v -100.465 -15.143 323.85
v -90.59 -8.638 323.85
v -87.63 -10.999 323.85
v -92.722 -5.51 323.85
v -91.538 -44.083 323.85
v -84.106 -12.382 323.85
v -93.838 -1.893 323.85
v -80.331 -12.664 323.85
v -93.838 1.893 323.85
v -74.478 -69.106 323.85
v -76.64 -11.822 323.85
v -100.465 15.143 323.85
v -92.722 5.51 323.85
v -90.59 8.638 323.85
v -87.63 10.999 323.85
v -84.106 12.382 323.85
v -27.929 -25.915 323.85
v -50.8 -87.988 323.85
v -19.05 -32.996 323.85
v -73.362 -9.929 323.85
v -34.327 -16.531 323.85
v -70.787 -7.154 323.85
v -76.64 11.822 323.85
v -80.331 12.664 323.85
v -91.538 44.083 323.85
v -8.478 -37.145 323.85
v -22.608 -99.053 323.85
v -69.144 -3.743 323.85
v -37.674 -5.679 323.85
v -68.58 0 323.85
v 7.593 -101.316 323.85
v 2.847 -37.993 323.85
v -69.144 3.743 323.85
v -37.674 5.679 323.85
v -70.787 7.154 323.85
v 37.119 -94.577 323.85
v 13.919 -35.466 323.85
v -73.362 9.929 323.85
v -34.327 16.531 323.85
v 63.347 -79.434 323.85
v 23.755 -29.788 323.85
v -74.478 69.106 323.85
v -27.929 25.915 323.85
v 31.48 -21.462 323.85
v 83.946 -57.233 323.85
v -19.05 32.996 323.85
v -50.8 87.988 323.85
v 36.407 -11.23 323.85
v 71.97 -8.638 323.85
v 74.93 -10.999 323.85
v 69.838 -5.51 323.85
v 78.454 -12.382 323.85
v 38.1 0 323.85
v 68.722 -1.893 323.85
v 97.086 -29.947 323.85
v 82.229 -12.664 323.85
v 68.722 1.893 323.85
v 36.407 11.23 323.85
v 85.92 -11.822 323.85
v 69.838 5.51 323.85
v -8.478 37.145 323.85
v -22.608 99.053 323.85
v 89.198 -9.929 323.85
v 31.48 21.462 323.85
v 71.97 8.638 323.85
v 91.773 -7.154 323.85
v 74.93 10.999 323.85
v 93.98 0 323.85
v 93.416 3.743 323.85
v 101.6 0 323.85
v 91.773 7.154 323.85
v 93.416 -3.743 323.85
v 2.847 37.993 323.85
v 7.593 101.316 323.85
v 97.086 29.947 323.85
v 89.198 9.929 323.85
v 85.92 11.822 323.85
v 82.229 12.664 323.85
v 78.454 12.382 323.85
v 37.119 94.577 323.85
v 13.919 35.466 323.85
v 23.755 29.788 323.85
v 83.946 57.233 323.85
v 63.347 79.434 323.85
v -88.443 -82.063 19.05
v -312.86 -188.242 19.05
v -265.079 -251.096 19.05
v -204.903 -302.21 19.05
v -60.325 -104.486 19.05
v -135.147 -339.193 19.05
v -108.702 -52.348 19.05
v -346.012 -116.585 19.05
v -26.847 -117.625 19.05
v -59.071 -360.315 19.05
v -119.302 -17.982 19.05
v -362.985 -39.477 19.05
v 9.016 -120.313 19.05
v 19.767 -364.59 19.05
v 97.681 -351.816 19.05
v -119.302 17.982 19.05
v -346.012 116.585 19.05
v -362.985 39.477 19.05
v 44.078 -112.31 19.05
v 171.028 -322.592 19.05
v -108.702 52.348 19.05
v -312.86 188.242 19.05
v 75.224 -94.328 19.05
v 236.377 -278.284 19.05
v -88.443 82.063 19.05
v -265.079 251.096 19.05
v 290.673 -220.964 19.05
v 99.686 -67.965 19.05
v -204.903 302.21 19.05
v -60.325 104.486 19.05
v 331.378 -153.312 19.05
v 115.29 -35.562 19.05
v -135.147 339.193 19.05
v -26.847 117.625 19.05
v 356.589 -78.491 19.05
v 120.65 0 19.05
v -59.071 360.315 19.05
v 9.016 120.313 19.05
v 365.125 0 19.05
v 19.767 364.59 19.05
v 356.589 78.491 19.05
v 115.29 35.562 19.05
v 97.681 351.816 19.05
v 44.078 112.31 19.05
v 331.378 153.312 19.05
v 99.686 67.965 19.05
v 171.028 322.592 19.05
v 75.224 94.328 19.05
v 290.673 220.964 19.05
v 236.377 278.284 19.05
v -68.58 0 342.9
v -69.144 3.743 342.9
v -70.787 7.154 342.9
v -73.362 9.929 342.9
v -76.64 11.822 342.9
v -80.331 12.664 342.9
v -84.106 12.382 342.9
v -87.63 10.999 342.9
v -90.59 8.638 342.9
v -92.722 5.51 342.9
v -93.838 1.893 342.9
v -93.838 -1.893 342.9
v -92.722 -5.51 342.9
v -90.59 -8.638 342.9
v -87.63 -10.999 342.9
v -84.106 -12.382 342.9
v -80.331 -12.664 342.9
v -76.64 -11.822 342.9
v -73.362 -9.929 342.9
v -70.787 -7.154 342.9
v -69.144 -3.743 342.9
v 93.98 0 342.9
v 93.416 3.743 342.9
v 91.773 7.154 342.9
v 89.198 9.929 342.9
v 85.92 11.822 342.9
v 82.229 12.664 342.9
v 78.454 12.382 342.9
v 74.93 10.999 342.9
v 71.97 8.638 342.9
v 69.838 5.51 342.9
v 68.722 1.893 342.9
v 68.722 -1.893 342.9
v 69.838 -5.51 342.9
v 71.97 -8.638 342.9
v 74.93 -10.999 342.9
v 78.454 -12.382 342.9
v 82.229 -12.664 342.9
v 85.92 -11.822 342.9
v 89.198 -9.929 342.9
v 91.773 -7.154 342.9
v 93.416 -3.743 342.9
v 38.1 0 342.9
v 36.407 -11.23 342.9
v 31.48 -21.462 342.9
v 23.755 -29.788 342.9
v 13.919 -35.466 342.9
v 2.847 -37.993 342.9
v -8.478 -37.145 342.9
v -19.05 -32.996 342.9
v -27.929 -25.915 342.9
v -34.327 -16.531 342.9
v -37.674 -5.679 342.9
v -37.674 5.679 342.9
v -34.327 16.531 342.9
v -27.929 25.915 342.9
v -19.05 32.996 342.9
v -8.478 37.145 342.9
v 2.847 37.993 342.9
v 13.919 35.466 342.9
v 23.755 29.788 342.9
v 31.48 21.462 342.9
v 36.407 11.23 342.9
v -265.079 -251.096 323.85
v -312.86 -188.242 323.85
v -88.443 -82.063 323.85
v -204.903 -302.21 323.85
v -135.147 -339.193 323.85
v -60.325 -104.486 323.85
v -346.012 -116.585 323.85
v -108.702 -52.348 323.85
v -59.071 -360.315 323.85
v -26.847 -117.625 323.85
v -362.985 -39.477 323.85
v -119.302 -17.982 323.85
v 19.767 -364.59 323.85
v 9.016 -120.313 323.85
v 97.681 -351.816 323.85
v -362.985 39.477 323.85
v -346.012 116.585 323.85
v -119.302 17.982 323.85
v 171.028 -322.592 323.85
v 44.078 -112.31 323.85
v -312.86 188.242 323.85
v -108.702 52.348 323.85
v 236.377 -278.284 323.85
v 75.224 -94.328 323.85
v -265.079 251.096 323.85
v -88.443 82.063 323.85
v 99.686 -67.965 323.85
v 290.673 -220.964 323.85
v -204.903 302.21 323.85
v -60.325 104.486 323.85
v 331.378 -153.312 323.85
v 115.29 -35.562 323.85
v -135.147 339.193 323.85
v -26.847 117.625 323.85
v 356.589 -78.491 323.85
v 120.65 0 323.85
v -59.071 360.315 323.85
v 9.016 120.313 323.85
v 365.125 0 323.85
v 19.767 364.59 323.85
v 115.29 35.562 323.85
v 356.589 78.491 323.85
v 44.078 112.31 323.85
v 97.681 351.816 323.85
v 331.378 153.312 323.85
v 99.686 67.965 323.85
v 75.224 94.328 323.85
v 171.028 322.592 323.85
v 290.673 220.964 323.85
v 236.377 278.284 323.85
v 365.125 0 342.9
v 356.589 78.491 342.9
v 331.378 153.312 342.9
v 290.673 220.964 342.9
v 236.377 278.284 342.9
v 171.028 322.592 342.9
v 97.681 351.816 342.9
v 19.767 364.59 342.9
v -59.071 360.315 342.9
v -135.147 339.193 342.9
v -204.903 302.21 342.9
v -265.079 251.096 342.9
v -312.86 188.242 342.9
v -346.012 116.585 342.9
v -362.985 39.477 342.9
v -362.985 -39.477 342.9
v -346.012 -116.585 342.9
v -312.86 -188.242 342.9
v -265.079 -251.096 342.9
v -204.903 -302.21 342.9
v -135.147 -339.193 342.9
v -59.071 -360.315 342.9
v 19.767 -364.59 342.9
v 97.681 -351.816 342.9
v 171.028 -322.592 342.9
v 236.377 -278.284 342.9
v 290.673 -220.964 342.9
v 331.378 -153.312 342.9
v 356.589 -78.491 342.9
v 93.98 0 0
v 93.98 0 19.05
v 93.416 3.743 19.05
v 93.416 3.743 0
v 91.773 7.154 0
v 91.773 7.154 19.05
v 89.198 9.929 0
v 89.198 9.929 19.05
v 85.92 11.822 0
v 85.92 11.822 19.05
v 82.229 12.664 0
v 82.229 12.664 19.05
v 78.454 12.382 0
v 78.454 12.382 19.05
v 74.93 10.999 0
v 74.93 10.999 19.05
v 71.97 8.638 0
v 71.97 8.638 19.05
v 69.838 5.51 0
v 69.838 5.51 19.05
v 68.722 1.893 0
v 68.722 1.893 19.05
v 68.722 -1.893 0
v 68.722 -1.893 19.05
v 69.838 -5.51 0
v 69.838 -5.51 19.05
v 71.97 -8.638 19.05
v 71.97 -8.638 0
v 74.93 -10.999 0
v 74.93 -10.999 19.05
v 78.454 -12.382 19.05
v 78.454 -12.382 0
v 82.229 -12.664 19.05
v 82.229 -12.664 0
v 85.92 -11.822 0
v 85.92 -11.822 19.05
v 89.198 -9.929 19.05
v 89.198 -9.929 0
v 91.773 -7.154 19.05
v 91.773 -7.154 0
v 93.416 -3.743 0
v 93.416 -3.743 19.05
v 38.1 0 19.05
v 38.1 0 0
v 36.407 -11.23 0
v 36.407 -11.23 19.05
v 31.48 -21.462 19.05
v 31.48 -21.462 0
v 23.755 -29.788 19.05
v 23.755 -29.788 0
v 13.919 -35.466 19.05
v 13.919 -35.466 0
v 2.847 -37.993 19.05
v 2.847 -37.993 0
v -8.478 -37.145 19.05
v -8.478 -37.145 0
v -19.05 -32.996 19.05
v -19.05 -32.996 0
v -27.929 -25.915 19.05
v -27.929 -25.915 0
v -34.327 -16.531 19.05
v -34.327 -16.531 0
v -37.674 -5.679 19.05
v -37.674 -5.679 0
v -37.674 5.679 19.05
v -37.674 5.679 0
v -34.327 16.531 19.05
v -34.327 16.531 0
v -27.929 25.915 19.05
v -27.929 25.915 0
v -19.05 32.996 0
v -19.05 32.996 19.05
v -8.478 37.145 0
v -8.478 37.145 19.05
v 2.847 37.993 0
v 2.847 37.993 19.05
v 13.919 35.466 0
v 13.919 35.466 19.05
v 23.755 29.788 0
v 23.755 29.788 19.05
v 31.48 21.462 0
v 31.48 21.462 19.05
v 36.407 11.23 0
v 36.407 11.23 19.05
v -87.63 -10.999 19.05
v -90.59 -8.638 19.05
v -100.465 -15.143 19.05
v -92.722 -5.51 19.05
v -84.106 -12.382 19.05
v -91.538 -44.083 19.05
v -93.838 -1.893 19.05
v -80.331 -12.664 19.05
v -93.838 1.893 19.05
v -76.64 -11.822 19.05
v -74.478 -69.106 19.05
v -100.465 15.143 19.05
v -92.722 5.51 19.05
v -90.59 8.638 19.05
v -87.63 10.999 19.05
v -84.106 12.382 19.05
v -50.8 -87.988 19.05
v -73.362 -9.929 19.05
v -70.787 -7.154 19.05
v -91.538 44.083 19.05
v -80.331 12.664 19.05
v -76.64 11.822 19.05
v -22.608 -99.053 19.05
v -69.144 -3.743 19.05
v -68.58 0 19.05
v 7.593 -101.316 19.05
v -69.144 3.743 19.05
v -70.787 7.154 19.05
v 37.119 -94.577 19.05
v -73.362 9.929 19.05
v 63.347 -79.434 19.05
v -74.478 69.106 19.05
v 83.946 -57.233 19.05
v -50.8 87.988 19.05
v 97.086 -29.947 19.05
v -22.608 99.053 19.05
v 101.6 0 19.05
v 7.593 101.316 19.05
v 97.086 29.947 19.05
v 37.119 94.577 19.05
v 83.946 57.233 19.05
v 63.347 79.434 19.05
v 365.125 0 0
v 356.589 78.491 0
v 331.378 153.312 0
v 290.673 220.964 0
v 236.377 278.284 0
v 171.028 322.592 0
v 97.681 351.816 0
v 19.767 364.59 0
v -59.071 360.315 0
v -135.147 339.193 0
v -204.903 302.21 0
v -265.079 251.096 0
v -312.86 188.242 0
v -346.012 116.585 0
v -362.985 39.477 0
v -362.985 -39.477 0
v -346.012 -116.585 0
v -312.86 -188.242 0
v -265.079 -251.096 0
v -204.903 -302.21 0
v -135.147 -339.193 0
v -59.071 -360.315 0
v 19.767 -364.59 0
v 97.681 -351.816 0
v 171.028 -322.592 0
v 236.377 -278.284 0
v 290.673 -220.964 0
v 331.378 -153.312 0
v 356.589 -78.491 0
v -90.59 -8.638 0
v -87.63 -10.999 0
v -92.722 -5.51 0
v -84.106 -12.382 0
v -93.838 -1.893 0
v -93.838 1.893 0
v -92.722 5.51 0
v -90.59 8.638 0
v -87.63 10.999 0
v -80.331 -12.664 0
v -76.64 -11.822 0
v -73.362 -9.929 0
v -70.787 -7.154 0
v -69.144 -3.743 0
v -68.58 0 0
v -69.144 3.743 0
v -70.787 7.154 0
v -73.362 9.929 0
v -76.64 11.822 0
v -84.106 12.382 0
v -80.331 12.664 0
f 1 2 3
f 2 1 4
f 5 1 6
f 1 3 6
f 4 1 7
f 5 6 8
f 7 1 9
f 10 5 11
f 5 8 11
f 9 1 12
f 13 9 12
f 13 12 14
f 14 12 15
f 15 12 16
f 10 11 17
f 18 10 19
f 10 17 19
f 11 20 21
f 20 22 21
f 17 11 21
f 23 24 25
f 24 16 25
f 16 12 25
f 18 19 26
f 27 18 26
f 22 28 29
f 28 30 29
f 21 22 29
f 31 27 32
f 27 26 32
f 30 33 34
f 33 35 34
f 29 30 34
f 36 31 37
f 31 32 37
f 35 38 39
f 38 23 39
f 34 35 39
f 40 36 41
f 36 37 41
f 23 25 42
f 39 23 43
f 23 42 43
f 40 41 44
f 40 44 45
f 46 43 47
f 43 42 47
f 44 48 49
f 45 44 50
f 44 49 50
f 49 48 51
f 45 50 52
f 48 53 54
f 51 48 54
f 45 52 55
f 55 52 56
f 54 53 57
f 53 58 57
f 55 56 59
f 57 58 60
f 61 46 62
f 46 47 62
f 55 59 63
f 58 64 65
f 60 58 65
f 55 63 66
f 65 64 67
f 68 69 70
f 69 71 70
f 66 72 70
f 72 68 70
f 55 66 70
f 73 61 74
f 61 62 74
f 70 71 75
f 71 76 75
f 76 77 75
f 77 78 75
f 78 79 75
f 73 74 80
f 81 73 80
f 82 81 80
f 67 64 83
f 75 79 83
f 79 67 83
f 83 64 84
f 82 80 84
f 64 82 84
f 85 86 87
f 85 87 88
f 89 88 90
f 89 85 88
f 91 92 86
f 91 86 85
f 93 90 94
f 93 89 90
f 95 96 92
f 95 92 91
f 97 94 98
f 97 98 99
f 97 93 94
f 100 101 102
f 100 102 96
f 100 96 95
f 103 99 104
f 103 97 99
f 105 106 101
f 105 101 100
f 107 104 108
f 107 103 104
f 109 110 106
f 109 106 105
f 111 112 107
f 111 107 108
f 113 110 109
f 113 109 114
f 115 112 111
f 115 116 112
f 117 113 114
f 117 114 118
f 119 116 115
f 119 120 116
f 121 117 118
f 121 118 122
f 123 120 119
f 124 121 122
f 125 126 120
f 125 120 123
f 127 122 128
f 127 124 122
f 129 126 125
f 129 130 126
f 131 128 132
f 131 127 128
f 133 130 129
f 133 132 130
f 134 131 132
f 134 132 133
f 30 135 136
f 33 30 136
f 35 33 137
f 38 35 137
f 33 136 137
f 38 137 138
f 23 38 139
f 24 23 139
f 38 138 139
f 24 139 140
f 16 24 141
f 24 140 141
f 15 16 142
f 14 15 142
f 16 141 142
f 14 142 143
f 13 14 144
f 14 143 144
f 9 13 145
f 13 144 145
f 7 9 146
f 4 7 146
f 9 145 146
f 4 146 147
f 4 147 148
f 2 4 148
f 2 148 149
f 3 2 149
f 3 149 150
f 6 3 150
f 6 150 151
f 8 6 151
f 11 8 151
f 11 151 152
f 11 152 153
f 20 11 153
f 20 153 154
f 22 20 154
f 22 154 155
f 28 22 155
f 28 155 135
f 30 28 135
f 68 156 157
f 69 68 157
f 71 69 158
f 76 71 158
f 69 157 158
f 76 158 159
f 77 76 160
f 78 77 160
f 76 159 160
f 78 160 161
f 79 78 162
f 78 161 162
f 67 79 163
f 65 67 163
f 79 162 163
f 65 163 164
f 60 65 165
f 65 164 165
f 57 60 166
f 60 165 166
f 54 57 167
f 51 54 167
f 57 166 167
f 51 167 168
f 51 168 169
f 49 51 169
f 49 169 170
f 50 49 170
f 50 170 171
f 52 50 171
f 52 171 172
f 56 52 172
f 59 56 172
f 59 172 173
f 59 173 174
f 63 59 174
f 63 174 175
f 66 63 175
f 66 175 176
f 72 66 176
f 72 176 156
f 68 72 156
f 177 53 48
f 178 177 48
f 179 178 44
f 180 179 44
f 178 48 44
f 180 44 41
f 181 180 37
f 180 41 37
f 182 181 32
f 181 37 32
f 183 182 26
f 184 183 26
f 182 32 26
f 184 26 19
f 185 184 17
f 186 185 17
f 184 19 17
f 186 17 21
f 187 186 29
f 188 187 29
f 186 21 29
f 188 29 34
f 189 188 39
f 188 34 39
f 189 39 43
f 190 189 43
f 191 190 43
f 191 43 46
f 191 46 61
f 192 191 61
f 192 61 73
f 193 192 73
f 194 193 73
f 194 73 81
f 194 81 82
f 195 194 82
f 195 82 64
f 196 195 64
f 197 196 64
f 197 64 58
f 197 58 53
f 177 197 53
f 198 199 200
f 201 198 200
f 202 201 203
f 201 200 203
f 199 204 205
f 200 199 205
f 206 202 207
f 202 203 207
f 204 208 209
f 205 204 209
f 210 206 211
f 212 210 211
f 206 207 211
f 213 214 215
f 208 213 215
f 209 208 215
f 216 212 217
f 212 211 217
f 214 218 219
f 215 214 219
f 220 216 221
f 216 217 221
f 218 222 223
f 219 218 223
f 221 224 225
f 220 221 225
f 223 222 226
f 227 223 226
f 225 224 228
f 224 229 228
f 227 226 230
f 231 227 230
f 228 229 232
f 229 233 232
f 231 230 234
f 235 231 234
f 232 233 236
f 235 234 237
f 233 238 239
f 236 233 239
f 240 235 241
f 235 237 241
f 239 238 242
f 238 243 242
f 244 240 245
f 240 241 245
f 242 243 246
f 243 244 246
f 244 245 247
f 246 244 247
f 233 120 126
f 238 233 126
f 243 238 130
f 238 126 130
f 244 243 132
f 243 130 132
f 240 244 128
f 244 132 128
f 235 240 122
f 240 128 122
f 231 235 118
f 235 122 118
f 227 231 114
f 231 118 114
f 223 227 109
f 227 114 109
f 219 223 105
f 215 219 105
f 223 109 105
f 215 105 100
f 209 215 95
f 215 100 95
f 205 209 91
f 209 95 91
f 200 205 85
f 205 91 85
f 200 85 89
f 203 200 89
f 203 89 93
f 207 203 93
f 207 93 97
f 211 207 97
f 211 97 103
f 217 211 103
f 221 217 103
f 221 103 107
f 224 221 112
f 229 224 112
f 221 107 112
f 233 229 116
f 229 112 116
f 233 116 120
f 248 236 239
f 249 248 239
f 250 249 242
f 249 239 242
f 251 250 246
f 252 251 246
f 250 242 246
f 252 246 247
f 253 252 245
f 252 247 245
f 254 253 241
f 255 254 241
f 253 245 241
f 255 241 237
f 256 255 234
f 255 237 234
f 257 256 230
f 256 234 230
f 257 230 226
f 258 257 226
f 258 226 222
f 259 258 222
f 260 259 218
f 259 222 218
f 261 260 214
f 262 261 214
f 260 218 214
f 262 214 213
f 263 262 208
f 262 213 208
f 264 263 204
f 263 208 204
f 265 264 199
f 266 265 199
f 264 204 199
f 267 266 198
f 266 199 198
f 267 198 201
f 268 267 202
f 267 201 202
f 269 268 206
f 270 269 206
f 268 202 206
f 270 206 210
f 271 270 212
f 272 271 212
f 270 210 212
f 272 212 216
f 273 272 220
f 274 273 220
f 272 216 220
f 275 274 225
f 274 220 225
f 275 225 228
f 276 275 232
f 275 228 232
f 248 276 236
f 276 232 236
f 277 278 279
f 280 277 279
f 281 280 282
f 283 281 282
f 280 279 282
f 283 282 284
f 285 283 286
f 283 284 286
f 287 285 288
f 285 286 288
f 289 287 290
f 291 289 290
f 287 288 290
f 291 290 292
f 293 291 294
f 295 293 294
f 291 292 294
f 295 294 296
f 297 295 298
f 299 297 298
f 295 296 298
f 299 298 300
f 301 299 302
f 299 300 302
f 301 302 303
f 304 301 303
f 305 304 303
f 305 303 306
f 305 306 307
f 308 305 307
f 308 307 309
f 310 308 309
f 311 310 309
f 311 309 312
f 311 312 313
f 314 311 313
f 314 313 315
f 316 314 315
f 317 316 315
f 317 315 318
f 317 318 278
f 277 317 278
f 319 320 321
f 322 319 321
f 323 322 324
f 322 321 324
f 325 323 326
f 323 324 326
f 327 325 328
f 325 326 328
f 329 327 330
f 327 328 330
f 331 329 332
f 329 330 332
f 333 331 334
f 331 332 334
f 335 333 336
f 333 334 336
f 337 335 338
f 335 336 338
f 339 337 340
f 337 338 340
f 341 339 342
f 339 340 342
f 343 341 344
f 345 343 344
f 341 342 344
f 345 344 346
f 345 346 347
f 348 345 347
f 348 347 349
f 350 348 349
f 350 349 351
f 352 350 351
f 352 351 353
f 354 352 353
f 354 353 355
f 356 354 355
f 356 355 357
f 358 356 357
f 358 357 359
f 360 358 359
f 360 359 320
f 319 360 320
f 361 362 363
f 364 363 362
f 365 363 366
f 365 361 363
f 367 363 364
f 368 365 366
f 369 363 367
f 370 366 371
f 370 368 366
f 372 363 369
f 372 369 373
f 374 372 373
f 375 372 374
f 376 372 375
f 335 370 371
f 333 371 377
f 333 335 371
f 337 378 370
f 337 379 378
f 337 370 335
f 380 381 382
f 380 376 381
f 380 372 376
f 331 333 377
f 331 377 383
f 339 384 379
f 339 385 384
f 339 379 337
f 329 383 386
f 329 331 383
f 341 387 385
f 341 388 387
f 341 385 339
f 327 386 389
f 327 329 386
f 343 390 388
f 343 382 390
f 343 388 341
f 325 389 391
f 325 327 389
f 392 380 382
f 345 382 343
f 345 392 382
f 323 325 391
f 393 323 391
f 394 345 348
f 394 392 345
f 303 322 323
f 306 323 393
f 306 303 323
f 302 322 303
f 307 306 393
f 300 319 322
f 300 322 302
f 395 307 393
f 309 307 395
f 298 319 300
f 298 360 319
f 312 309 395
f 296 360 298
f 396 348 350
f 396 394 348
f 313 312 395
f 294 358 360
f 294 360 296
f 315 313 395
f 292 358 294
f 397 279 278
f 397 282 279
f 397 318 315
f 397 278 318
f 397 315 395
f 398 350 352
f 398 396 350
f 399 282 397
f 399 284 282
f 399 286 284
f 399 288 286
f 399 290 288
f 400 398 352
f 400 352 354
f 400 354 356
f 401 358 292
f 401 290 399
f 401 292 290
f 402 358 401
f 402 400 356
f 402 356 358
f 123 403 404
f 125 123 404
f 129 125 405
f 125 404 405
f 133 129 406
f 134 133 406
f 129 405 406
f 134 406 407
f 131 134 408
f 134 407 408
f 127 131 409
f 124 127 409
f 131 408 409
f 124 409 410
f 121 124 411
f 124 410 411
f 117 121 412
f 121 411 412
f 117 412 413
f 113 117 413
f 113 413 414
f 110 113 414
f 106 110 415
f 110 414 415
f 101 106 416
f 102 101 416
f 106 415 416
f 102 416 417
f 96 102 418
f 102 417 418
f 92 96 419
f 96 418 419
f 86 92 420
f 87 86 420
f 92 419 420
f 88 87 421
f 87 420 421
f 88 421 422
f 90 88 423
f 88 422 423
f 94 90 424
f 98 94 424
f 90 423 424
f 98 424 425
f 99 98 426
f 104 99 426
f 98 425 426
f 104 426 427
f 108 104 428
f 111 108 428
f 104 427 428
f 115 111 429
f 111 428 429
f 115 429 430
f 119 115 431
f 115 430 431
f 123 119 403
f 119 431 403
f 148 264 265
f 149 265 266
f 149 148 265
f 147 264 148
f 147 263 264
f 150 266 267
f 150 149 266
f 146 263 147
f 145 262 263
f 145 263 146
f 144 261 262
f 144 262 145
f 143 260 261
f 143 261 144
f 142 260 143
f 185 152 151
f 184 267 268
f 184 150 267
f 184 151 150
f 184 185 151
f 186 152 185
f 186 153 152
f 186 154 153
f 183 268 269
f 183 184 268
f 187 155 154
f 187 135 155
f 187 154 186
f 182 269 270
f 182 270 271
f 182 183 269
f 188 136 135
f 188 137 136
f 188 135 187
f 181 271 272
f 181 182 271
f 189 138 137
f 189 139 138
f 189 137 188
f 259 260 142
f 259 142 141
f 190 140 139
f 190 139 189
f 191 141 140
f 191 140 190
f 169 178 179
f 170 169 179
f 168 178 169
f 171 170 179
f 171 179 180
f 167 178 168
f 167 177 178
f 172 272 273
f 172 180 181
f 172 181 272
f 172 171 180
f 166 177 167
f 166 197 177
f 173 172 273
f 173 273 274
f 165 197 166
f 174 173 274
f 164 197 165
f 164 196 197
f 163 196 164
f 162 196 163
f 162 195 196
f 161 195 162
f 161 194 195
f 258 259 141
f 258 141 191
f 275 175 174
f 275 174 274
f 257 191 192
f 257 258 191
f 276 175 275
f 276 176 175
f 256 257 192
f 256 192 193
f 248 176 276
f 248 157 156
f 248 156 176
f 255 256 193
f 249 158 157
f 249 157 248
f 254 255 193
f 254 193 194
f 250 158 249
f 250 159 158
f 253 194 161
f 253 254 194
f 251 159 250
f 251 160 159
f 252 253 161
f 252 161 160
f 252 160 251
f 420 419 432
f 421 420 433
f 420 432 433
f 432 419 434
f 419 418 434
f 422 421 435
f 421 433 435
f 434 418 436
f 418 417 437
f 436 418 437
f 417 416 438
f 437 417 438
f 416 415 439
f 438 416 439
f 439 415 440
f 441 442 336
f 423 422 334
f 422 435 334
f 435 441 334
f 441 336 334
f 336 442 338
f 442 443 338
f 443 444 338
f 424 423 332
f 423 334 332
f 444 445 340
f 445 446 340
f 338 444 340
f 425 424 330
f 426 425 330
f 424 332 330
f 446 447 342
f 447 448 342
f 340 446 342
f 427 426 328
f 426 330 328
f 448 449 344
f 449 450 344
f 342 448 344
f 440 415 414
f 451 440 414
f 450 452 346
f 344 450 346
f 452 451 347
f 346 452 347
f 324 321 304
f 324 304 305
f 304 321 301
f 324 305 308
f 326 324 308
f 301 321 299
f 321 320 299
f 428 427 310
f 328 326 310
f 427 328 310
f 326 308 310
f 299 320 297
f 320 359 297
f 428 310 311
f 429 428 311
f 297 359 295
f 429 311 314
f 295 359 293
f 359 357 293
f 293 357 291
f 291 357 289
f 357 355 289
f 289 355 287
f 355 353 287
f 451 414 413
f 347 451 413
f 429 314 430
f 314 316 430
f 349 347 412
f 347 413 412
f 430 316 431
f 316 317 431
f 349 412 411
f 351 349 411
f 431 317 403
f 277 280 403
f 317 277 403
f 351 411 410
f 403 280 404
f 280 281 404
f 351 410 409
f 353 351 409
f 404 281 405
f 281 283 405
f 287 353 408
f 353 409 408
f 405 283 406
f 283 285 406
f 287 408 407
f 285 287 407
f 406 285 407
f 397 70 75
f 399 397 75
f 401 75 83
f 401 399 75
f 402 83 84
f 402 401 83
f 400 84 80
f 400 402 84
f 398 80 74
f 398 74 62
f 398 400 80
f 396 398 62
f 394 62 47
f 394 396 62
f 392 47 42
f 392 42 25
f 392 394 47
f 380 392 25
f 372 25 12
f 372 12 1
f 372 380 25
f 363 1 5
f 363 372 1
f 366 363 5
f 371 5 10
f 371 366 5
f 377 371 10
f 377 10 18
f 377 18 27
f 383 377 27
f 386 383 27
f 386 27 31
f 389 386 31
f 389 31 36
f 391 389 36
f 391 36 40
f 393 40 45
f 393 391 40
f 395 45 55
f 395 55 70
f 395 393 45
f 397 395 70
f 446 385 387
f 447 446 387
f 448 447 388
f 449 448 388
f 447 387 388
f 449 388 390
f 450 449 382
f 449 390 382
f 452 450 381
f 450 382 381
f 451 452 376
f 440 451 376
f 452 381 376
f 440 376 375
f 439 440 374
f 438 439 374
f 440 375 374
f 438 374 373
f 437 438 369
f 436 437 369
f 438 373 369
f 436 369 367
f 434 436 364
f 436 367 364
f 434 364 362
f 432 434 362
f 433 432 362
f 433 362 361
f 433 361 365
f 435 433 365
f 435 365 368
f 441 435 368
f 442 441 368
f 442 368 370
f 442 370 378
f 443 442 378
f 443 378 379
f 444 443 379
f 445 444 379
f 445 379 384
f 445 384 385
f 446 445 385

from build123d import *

# Parameters (mm, degrees)
F0_R     = 365.125
F1_DEPTH = 19.05
F2_R     = 120.65
F2_R_2   = 101.6
F3_DEPTH = 304.8
F4_R     = 365.125
F4_R_2   = 120.65
F4_R_3   = 101.6
F5_DEPTH = 19.05
F6_R     = 38.1
F7_DEPTH = 355.6
F8_R     = 12.7
F9_DEPTH = 355.6


with BuildPart() as f1:
    # F0 (on Top) → F1 (new body)
    with BuildSketch(Plane.XY):
        Circle(F0_R)
    extrude(amount=F1_DEPTH)

    # F2 (on face) → F3 (join)
    with BuildSketch(Plane.XY.offset(19.05)):
        Circle(F2_R)
        Circle(F2_R_2, mode=Mode.SUBTRACT)
    extrude(amount=F3_DEPTH)

    # F4 (on face) → F5 (join)
    with BuildSketch(Plane.XY.offset(323.85)):
        Circle(F4_R)
        Circle(F4_R_2, mode=Mode.SUBTRACT)
        Circle(F4_R_2)
        Circle(F4_R_3, mode=Mode.SUBTRACT)
        Circle(F4_R_3)
    extrude(amount=F5_DEPTH)

    # F6 (on face) → F7 (cut)
    with BuildSketch(Plane(origin=(0, 0, 0), x_dir=(1, 0, 0), z_dir=(0, 0, -1))):
        Circle(F6_R)
    extrude(amount=-F7_DEPTH, mode=Mode.SUBTRACT)

    # F8 (on face) → F9 (cut)
    with BuildSketch(Plane.XY.offset(342.9)):
        with Locations((-81.28, 0)):
            Circle(F8_R)
        with Locations((81.28, 0)):
            Circle(F8_R)
    extrude(amount=-F9_DEPTH, mode=Mode.SUBTRACT)


solid = f1.part
